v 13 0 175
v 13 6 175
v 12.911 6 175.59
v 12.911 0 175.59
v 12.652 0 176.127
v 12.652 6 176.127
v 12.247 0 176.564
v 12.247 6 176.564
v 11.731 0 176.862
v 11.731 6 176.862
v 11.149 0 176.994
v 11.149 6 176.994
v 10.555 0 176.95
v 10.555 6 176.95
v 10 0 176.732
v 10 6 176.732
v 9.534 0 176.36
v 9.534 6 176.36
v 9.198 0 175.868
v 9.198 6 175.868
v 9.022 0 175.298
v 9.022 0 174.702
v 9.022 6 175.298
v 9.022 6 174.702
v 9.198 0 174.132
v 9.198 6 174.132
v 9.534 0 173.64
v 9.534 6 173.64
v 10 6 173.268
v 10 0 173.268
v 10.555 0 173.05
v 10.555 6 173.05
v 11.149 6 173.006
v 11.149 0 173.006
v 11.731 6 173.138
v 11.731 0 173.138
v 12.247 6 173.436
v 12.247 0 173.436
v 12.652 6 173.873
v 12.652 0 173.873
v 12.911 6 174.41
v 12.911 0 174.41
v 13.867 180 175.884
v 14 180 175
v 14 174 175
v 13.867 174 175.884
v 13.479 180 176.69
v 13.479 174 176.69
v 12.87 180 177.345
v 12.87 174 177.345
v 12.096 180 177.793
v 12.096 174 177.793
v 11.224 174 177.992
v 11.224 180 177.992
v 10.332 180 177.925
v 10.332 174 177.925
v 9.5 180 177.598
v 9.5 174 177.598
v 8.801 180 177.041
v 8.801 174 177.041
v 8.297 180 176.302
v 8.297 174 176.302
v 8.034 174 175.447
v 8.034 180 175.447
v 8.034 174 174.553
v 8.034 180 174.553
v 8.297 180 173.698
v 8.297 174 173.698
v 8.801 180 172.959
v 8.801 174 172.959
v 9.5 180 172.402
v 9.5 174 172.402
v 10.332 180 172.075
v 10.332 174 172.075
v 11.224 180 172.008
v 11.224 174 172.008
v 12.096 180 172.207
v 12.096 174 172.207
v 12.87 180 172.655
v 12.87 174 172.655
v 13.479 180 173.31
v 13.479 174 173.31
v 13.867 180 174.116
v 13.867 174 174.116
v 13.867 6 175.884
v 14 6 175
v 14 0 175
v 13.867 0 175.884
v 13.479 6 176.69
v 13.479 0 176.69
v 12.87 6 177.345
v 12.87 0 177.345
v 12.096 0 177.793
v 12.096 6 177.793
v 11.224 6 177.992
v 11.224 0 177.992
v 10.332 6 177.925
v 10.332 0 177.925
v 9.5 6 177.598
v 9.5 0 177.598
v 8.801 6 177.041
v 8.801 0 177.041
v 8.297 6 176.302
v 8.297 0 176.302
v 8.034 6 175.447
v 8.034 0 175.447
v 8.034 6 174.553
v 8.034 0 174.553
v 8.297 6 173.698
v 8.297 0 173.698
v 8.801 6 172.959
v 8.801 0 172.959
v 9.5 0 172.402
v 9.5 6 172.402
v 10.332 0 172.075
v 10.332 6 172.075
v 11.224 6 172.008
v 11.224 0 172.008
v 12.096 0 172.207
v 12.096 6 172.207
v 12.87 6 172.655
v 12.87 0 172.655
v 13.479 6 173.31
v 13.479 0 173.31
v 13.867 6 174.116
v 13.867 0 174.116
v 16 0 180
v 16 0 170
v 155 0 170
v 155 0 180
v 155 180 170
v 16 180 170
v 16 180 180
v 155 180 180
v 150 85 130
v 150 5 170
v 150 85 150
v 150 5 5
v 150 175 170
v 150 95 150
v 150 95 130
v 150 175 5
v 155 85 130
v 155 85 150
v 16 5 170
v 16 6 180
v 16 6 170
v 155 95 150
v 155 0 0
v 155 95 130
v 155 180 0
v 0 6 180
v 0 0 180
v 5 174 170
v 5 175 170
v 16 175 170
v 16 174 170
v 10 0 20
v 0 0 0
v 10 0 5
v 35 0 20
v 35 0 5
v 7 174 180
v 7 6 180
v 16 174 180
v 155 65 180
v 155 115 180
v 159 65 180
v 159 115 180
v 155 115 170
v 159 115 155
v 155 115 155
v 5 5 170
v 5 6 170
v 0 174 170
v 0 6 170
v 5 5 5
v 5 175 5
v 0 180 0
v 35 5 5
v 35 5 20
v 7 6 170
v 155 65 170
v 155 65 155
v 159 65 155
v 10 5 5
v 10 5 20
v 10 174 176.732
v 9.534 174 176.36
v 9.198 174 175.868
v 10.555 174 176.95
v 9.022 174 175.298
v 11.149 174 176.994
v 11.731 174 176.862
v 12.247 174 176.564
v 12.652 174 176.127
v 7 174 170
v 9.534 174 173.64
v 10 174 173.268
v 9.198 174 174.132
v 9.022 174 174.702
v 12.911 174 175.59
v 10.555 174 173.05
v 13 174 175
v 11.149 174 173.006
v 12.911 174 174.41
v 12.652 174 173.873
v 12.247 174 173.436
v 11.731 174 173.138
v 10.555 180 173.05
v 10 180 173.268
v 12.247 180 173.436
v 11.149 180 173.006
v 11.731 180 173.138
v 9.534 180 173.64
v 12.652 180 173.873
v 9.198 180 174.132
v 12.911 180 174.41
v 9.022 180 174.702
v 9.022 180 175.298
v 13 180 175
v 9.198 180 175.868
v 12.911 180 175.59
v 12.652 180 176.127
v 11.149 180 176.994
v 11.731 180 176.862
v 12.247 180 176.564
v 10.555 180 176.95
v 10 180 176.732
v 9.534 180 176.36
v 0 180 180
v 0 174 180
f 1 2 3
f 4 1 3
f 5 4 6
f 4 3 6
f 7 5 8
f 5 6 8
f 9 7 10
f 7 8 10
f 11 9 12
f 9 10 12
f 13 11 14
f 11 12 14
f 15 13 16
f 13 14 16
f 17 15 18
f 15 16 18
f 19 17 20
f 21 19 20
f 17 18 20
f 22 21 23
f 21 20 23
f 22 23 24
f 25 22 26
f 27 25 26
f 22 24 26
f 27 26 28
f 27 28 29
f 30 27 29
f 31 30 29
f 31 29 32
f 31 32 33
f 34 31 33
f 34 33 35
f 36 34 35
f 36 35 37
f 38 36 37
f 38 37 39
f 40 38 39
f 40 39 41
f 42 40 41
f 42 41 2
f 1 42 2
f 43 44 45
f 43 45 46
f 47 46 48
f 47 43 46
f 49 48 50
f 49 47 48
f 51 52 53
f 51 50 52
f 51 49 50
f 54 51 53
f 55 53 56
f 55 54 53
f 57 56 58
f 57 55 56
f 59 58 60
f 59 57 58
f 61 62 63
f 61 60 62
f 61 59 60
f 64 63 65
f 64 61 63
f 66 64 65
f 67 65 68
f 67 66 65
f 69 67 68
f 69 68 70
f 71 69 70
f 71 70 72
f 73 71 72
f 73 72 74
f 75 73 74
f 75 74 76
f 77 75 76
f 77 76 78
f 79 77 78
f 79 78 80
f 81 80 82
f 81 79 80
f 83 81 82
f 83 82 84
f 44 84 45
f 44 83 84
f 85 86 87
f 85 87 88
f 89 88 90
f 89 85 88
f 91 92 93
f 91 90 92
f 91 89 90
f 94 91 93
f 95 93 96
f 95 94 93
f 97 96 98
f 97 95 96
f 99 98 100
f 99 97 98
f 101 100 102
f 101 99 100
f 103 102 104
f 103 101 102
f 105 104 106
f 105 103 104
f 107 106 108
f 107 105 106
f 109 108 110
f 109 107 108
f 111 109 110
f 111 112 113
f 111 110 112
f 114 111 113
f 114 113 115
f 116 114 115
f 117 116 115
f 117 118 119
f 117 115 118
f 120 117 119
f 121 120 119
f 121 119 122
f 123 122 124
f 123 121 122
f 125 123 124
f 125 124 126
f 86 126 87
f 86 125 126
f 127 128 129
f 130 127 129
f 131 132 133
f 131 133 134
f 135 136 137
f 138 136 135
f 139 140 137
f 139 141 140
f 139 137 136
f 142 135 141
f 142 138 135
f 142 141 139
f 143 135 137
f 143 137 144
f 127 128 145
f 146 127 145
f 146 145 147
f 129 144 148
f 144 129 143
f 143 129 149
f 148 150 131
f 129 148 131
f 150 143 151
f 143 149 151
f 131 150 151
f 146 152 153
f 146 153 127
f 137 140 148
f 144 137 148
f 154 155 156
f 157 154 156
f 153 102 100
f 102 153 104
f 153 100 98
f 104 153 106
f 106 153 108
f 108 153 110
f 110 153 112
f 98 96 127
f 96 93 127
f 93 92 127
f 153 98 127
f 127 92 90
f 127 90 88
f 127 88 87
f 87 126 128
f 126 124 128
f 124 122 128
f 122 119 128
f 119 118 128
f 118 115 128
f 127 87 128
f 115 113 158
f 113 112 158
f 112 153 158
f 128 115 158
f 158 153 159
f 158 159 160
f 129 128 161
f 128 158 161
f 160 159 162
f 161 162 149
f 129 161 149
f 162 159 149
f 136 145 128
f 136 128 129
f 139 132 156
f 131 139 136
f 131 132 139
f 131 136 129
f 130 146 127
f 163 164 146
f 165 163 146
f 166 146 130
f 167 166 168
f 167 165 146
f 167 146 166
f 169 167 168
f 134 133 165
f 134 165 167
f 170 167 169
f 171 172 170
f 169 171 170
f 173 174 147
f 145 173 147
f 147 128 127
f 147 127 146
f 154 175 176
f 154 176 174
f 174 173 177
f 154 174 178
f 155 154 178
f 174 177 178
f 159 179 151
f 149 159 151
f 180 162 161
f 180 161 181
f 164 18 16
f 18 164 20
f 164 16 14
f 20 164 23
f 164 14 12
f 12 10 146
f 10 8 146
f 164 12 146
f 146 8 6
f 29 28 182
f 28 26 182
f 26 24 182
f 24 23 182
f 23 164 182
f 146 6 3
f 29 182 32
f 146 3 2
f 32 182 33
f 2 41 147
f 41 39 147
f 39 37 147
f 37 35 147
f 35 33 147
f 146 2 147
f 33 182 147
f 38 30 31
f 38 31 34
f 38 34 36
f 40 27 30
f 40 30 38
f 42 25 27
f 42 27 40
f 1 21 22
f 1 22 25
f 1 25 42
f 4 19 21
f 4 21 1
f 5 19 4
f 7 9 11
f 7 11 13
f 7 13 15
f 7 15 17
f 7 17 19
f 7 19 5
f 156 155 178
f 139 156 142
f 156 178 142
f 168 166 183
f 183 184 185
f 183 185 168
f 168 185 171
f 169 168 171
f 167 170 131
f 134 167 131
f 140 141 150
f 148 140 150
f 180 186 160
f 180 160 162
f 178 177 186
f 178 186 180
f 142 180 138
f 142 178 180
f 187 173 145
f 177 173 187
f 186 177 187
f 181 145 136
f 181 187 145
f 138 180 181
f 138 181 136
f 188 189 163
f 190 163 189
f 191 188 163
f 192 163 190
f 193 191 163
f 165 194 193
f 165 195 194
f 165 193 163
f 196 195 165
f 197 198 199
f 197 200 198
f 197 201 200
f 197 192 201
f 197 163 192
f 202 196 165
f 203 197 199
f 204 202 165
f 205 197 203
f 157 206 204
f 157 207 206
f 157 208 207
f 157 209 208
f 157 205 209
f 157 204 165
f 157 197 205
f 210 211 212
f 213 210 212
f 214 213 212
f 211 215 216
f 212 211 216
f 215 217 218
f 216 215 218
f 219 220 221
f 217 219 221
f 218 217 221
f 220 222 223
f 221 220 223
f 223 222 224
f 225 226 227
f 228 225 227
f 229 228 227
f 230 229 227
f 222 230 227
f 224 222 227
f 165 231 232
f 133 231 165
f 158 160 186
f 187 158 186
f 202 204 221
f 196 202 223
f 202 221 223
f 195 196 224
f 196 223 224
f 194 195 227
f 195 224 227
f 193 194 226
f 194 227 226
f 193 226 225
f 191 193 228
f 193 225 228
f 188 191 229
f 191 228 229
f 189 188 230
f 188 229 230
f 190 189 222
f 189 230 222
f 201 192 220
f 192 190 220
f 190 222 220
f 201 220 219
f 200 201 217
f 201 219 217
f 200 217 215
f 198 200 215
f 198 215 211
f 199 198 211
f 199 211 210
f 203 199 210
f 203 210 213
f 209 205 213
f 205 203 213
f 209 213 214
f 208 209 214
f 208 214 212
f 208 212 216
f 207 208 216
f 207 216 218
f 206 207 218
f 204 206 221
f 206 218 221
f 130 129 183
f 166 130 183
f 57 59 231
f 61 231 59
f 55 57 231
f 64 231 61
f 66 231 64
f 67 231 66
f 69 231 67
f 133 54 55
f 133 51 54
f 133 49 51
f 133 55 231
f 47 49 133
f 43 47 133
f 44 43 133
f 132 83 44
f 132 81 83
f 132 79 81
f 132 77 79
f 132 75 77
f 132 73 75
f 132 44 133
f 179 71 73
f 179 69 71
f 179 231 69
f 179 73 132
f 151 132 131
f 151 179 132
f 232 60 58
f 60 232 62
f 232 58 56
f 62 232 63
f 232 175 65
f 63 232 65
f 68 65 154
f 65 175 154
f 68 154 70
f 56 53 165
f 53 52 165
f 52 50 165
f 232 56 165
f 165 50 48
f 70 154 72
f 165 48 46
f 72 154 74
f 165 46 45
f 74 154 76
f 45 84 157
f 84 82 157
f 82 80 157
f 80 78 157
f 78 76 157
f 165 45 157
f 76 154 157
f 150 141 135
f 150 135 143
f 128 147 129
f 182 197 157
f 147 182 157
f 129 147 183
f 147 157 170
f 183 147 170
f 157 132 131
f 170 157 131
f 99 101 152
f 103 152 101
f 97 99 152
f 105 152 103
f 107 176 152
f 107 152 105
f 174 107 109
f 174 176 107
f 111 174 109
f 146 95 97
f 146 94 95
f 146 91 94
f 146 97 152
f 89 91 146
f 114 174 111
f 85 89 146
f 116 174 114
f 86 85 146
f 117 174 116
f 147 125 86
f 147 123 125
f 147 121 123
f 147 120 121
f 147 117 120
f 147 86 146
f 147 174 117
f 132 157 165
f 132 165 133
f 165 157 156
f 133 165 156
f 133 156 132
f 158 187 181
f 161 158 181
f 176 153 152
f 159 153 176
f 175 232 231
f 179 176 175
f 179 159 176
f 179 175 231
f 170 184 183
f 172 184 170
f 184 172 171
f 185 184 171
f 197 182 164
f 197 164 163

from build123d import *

# Parameters (mm, degrees)
CYLINDER003_R     = 3
CYLINDER003_DEPTH = 148
BOX013_W          = 16
BOX013_H          = 6
BOX013_DEPTH      = 10
CYLINDER002_R     = 3
CYLINDER002_DEPTH = 148
BOX012_W          = 16
BOX012_H          = 6
BOX012_DEPTH      = 10
BOX011_W          = 12
BOX011_H          = 10
BOX011_DEPTH      = 20
BOX010_W          = 25
BOX010_H          = 25
BOX010_DEPTH      = 15
BOX009_W          = 145
BOX009_H          = 170
BOX009_DEPTH      = 200
BOX008_W          = 155
BOX008_H          = 180
BOX008_DEPTH      = 170
CYLINDER005_R     = 2
CYLINDER005_DEPTH = 137
CYLINDER004_R     = 2
CYLINDER004_DEPTH = 139
BOX017_W          = 10
BOX017_H          = 180
BOX017_DEPTH      = 10
BOX015_W          = 10
BOX015_H          = 10
BOX015_DEPTH      = 10
BOX016_W          = 10
BOX016_H          = 10
BOX016_DEPTH      = 10
BOX014_W          = 11
BOX014_H          = 180
BOX014_DEPTH      = 10
CYLINDER001_R     = 3
CYLINDER001_DEPTH = 148
BOX007_W          = 16
BOX007_H          = 6
BOX007_DEPTH      = 10
CYLINDER_R        = 3
CYLINDER_DEPTH    = 148
BOX006_W          = 16
BOX006_H          = 6
BOX006_DEPTH      = 10
BOX005_W          = 12
BOX005_H          = 10
BOX005_DEPTH      = 20
BOX003_W          = 25
BOX003_H          = 25
BOX003_DEPTH      = 15
BOX001_W          = 145
BOX001_H          = 170
BOX001_DEPTH      = 200
BOX_W             = 155
BOX_H             = 180
BOX_DEPTH         = 170
BOX004_W          = 4
BOX004_H          = 50
BOX004_DEPTH      = 25
BOX002_W          = 155
BOX002_H          = 180
BOX002_DEPTH      = 10


with BuildPart() as cylinder003:
    # Cylinder003 → Cylinder003 (new body)
    with BuildSketch(Plane(origin=(11, 139, 175), x_dir=(1, 0, 0), z_dir=(0, -1, 0))):
        Circle(CYLINDER003_R)
    extrude(amount=CYLINDER003_DEPTH)


with BuildPart() as box013:
    # Box013 → Box013 (new body)
    with BuildSketch(Plane.XY.offset(170)):
        with Locations((8, 3)):
            Rectangle(BOX013_W, BOX013_H)
    extrude(amount=BOX013_DEPTH)


with BuildPart() as visagra004:
    # Cut010 base: copy of Box013
    add(box013.part)

    # Cut010: cut Cylinder003
    add(cylinder003.part, mode=Mode.SUBTRACT)


with BuildPart() as cylinder002:
    # Cylinder002 → Cylinder002 (new body)
    with BuildSketch(Plane(origin=(11, 191, 175), x_dir=(1, 0, 0), z_dir=(0, -1, 0))):
        Circle(CYLINDER002_R)
    extrude(amount=CYLINDER002_DEPTH)


with BuildPart() as box012:
    # Box012 → Box012 (new body)
    with BuildSketch(Plane(origin=(0, 174, 170), x_dir=(1, 0, 0), z_dir=(0, 0, 1))):
        with Locations((8, 3)):
            Rectangle(BOX012_W, BOX012_H)
    extrude(amount=BOX012_DEPTH)


with BuildPart() as visagra003:
    # Cut009 base: copy of Box012
    add(box012.part)

    # Cut009: cut Cylinder002
    add(cylinder002.part, mode=Mode.SUBTRACT)


with BuildPart() as cube006:
    # Box011 → Box011 (new body)
    with BuildSketch(Plane(origin=(146, 85, 130), x_dir=(1, 0, 0), z_dir=(0, 0, 1))):
        with Locations((6, 5)):
            Rectangle(BOX011_W, BOX011_H)
    extrude(amount=BOX011_DEPTH)


with BuildPart() as agujero001:
    # Box010 → Box010 (new body)
    with BuildSketch(Plane(origin=(10, -7, 5), x_dir=(1, 0, 0), z_dir=(0, 0, 1))):
        with Locations((12.5, 12.5)):
            Rectangle(BOX010_W, BOX010_H)
    extrude(amount=BOX010_DEPTH)


with BuildPart() as cube005:
    # Box009 → Box009 (new body)
    with BuildSketch(Plane(origin=(5, 5, 5), x_dir=(1, 0, 0), z_dir=(0, 0, 1))):
        with Locations((72.5, 85)):
            Rectangle(BOX009_W, BOX009_H)
    extrude(amount=BOX009_DEPTH)


with BuildPart() as caja002:
    # Box008 → Box008 (new body)
    with BuildSketch(Plane.XY):
        with Locations((77.5, 90)):
            Rectangle(BOX008_W, BOX008_H)
    extrude(amount=BOX008_DEPTH)

    # Cut006: cut Cube005
    add(cube005.part, mode=Mode.SUBTRACT)

    # Cut007: cut Agujero001
    add(agujero001.part, mode=Mode.SUBTRACT)

    # Cut008: cut Cube006
    add(cube006.part, mode=Mode.SUBTRACT)

    # Fusion003: union visagra003
    add(visagra003.part)

    # Fusion004: union visagra004
    add(visagra004.part)


with BuildPart() as cylinder005:
    # Cylinder005 → Cylinder005 (new body)
    with BuildSketch(Plane(origin=(11, 180, 175), x_dir=(1, 0, 0), z_dir=(0, -1, 0))):
        Circle(CYLINDER005_R)
    extrude(amount=CYLINDER005_DEPTH)


with BuildPart() as cylinder004:
    # Cylinder004 → Cylinder004 (new body)
    with BuildSketch(Plane(origin=(11, 139, 175), x_dir=(1, 0, 0), z_dir=(0, -1, 0))):
        Circle(CYLINDER004_R)
    extrude(amount=CYLINDER004_DEPTH)


with BuildPart() as cube010:
    # Box017 → Box017 (new body)
    with BuildSketch(Plane(origin=(7, 0, 170), x_dir=(1, 0, 0), z_dir=(0, 0, 1))):
        with Locations((5, 90)):
            Rectangle(BOX017_W, BOX017_H)
    extrude(amount=BOX017_DEPTH)


with BuildPart() as cube008:
    # Box015 → Box015 (new body)
    with BuildSketch(Plane(origin=(2, 174, 170), x_dir=(1, 0, 0), z_dir=(0, 0, 1))):
        with Locations((5, 5)):
            Rectangle(BOX015_W, BOX015_H)
    extrude(amount=BOX015_DEPTH)


with BuildPart() as cube009:
    # Box016 → Box016 (new body)
    with BuildSketch(Plane(origin=(2, -4, 170), x_dir=(1, 0, 0), z_dir=(0, 0, 1))):
        with Locations((5, 5)):
            Rectangle(BOX016_W, BOX016_H)
    extrude(amount=BOX016_DEPTH)


with BuildPart() as cube007:
    # Box014 → Box014 (new body)
    with BuildSketch(Plane(origin=(-4, 0, 170), x_dir=(1, 0, 0), z_dir=(0, 0, 1))):
        with Locations((5.5, 90)):
            Rectangle(BOX014_W, BOX014_H)
    extrude(amount=BOX014_DEPTH)


with BuildPart() as cylinder001:
    # Cylinder001 → Cylinder001 (new body)
    with BuildSketch(Plane(origin=(7, 139, 175), x_dir=(1, 0, 0), z_dir=(0, -1, 0))):
        Circle(CYLINDER001_R)
    extrude(amount=CYLINDER001_DEPTH)


with BuildPart() as visagra2:
    # Box007 → Box007 (new body)
    with BuildSketch(Plane.XY.offset(170)):
        with Locations((8, 3)):
            Rectangle(BOX007_W, BOX007_H)
    extrude(amount=BOX007_DEPTH)

    # Cut004: cut Cylinder001
    add(cylinder001.part, mode=Mode.SUBTRACT)


with BuildPart() as cylinder:
    # Cylinder → Cylinder (new body)
    with BuildSketch(Plane(origin=(7, 192, 175), x_dir=(1, 0, 0), z_dir=(0, -1, 0))):
        Circle(CYLINDER_R)
    extrude(amount=CYLINDER_DEPTH)


with BuildPart() as visagra1:
    # Box006 → Box006 (new body)
    with BuildSketch(Plane(origin=(0, 174, 170), x_dir=(1, 0, 0), z_dir=(0, 0, 1))):
        with Locations((8, 3)):
            Rectangle(BOX006_W, BOX006_H)
    extrude(amount=BOX006_DEPTH)

    # Cut003: cut Cylinder
    add(cylinder.part, mode=Mode.SUBTRACT)


with BuildPart() as cube003:
    # Box005 → Box005 (new body)
    with BuildSketch(Plane(origin=(146, 85, 130), x_dir=(1, 0, 0), z_dir=(0, 0, 1))):
        with Locations((6, 5)):
            Rectangle(BOX005_W, BOX005_H)
    extrude(amount=BOX005_DEPTH)


with BuildPart() as agujero:
    # Box003 → Box003 (new body)
    with BuildSketch(Plane(origin=(10, -7, 5), x_dir=(1, 0, 0), z_dir=(0, 0, 1))):
        with Locations((12.5, 12.5)):
            Rectangle(BOX003_W, BOX003_H)
    extrude(amount=BOX003_DEPTH)


with BuildPart() as cube001:
    # Box001 → Box001 (new body)
    with BuildSketch(Plane(origin=(5, 5, 5), x_dir=(1, 0, 0), z_dir=(0, 0, 1))):
        with Locations((72.5, 85)):
            Rectangle(BOX001_W, BOX001_H)
    extrude(amount=BOX001_DEPTH)


with BuildPart() as cuerpo:
    # Box → Box (new body)
    with BuildSketch(Plane.XY):
        with Locations((77.5, 90)):
            Rectangle(BOX_W, BOX_H)
    extrude(amount=BOX_DEPTH)

    # Cut: cut Cube001
    add(cube001.part, mode=Mode.SUBTRACT)

    # Cut001: cut Agujero
    add(agujero.part, mode=Mode.SUBTRACT)

    # Cut002: cut Cube003
    add(cube003.part, mode=Mode.SUBTRACT)

    # Fusion001: union visagra1
    add(visagra1.part)

    # Fusion002: union visagra2
    add(visagra2.part)


with BuildPart() as cube002:
    # Box004 → Box004 (new body)
    with BuildSketch(Plane(origin=(155, 65, 155), x_dir=(1, 0, 0), z_dir=(0, 0, 1))):
        with Locations((2, 25)):
            Rectangle(BOX004_W, BOX004_H)
    extrude(amount=BOX004_DEPTH)


with BuildPart() as tapa001:
    # Box002 → Box002 (new body)
    with BuildSketch(Plane.XY.offset(170)):
        with Locations((77.5, 90)):
            Rectangle(BOX002_W, BOX002_H)
    extrude(amount=BOX002_DEPTH)

    # Fusion: union Cube002
    add(cube002.part)

    # Cut005: cut cuerpo
    add(cuerpo.part, mode=Mode.SUBTRACT)

    # Cut011: cut Cube007
    add(cube007.part, mode=Mode.SUBTRACT)

    # Cut012: cut Cube009
    add(cube009.part, mode=Mode.SUBTRACT)

    # Cut013: cut Cube008
    add(cube008.part, mode=Mode.SUBTRACT)

    # Fusion005: union Cube010
    add(cube010.part)

    # Cut014: cut Box012
    add(box012.part, mode=Mode.SUBTRACT)

    # Cut015: cut Box013
    add(box013.part, mode=Mode.SUBTRACT)

    # Fusion006: union Cylinder004
    add(cylinder004.part)

    # Fusion007: union Cylinder005
    add(cylinder005.part)


solid = Compound([caja002.part, tapa001.part])
